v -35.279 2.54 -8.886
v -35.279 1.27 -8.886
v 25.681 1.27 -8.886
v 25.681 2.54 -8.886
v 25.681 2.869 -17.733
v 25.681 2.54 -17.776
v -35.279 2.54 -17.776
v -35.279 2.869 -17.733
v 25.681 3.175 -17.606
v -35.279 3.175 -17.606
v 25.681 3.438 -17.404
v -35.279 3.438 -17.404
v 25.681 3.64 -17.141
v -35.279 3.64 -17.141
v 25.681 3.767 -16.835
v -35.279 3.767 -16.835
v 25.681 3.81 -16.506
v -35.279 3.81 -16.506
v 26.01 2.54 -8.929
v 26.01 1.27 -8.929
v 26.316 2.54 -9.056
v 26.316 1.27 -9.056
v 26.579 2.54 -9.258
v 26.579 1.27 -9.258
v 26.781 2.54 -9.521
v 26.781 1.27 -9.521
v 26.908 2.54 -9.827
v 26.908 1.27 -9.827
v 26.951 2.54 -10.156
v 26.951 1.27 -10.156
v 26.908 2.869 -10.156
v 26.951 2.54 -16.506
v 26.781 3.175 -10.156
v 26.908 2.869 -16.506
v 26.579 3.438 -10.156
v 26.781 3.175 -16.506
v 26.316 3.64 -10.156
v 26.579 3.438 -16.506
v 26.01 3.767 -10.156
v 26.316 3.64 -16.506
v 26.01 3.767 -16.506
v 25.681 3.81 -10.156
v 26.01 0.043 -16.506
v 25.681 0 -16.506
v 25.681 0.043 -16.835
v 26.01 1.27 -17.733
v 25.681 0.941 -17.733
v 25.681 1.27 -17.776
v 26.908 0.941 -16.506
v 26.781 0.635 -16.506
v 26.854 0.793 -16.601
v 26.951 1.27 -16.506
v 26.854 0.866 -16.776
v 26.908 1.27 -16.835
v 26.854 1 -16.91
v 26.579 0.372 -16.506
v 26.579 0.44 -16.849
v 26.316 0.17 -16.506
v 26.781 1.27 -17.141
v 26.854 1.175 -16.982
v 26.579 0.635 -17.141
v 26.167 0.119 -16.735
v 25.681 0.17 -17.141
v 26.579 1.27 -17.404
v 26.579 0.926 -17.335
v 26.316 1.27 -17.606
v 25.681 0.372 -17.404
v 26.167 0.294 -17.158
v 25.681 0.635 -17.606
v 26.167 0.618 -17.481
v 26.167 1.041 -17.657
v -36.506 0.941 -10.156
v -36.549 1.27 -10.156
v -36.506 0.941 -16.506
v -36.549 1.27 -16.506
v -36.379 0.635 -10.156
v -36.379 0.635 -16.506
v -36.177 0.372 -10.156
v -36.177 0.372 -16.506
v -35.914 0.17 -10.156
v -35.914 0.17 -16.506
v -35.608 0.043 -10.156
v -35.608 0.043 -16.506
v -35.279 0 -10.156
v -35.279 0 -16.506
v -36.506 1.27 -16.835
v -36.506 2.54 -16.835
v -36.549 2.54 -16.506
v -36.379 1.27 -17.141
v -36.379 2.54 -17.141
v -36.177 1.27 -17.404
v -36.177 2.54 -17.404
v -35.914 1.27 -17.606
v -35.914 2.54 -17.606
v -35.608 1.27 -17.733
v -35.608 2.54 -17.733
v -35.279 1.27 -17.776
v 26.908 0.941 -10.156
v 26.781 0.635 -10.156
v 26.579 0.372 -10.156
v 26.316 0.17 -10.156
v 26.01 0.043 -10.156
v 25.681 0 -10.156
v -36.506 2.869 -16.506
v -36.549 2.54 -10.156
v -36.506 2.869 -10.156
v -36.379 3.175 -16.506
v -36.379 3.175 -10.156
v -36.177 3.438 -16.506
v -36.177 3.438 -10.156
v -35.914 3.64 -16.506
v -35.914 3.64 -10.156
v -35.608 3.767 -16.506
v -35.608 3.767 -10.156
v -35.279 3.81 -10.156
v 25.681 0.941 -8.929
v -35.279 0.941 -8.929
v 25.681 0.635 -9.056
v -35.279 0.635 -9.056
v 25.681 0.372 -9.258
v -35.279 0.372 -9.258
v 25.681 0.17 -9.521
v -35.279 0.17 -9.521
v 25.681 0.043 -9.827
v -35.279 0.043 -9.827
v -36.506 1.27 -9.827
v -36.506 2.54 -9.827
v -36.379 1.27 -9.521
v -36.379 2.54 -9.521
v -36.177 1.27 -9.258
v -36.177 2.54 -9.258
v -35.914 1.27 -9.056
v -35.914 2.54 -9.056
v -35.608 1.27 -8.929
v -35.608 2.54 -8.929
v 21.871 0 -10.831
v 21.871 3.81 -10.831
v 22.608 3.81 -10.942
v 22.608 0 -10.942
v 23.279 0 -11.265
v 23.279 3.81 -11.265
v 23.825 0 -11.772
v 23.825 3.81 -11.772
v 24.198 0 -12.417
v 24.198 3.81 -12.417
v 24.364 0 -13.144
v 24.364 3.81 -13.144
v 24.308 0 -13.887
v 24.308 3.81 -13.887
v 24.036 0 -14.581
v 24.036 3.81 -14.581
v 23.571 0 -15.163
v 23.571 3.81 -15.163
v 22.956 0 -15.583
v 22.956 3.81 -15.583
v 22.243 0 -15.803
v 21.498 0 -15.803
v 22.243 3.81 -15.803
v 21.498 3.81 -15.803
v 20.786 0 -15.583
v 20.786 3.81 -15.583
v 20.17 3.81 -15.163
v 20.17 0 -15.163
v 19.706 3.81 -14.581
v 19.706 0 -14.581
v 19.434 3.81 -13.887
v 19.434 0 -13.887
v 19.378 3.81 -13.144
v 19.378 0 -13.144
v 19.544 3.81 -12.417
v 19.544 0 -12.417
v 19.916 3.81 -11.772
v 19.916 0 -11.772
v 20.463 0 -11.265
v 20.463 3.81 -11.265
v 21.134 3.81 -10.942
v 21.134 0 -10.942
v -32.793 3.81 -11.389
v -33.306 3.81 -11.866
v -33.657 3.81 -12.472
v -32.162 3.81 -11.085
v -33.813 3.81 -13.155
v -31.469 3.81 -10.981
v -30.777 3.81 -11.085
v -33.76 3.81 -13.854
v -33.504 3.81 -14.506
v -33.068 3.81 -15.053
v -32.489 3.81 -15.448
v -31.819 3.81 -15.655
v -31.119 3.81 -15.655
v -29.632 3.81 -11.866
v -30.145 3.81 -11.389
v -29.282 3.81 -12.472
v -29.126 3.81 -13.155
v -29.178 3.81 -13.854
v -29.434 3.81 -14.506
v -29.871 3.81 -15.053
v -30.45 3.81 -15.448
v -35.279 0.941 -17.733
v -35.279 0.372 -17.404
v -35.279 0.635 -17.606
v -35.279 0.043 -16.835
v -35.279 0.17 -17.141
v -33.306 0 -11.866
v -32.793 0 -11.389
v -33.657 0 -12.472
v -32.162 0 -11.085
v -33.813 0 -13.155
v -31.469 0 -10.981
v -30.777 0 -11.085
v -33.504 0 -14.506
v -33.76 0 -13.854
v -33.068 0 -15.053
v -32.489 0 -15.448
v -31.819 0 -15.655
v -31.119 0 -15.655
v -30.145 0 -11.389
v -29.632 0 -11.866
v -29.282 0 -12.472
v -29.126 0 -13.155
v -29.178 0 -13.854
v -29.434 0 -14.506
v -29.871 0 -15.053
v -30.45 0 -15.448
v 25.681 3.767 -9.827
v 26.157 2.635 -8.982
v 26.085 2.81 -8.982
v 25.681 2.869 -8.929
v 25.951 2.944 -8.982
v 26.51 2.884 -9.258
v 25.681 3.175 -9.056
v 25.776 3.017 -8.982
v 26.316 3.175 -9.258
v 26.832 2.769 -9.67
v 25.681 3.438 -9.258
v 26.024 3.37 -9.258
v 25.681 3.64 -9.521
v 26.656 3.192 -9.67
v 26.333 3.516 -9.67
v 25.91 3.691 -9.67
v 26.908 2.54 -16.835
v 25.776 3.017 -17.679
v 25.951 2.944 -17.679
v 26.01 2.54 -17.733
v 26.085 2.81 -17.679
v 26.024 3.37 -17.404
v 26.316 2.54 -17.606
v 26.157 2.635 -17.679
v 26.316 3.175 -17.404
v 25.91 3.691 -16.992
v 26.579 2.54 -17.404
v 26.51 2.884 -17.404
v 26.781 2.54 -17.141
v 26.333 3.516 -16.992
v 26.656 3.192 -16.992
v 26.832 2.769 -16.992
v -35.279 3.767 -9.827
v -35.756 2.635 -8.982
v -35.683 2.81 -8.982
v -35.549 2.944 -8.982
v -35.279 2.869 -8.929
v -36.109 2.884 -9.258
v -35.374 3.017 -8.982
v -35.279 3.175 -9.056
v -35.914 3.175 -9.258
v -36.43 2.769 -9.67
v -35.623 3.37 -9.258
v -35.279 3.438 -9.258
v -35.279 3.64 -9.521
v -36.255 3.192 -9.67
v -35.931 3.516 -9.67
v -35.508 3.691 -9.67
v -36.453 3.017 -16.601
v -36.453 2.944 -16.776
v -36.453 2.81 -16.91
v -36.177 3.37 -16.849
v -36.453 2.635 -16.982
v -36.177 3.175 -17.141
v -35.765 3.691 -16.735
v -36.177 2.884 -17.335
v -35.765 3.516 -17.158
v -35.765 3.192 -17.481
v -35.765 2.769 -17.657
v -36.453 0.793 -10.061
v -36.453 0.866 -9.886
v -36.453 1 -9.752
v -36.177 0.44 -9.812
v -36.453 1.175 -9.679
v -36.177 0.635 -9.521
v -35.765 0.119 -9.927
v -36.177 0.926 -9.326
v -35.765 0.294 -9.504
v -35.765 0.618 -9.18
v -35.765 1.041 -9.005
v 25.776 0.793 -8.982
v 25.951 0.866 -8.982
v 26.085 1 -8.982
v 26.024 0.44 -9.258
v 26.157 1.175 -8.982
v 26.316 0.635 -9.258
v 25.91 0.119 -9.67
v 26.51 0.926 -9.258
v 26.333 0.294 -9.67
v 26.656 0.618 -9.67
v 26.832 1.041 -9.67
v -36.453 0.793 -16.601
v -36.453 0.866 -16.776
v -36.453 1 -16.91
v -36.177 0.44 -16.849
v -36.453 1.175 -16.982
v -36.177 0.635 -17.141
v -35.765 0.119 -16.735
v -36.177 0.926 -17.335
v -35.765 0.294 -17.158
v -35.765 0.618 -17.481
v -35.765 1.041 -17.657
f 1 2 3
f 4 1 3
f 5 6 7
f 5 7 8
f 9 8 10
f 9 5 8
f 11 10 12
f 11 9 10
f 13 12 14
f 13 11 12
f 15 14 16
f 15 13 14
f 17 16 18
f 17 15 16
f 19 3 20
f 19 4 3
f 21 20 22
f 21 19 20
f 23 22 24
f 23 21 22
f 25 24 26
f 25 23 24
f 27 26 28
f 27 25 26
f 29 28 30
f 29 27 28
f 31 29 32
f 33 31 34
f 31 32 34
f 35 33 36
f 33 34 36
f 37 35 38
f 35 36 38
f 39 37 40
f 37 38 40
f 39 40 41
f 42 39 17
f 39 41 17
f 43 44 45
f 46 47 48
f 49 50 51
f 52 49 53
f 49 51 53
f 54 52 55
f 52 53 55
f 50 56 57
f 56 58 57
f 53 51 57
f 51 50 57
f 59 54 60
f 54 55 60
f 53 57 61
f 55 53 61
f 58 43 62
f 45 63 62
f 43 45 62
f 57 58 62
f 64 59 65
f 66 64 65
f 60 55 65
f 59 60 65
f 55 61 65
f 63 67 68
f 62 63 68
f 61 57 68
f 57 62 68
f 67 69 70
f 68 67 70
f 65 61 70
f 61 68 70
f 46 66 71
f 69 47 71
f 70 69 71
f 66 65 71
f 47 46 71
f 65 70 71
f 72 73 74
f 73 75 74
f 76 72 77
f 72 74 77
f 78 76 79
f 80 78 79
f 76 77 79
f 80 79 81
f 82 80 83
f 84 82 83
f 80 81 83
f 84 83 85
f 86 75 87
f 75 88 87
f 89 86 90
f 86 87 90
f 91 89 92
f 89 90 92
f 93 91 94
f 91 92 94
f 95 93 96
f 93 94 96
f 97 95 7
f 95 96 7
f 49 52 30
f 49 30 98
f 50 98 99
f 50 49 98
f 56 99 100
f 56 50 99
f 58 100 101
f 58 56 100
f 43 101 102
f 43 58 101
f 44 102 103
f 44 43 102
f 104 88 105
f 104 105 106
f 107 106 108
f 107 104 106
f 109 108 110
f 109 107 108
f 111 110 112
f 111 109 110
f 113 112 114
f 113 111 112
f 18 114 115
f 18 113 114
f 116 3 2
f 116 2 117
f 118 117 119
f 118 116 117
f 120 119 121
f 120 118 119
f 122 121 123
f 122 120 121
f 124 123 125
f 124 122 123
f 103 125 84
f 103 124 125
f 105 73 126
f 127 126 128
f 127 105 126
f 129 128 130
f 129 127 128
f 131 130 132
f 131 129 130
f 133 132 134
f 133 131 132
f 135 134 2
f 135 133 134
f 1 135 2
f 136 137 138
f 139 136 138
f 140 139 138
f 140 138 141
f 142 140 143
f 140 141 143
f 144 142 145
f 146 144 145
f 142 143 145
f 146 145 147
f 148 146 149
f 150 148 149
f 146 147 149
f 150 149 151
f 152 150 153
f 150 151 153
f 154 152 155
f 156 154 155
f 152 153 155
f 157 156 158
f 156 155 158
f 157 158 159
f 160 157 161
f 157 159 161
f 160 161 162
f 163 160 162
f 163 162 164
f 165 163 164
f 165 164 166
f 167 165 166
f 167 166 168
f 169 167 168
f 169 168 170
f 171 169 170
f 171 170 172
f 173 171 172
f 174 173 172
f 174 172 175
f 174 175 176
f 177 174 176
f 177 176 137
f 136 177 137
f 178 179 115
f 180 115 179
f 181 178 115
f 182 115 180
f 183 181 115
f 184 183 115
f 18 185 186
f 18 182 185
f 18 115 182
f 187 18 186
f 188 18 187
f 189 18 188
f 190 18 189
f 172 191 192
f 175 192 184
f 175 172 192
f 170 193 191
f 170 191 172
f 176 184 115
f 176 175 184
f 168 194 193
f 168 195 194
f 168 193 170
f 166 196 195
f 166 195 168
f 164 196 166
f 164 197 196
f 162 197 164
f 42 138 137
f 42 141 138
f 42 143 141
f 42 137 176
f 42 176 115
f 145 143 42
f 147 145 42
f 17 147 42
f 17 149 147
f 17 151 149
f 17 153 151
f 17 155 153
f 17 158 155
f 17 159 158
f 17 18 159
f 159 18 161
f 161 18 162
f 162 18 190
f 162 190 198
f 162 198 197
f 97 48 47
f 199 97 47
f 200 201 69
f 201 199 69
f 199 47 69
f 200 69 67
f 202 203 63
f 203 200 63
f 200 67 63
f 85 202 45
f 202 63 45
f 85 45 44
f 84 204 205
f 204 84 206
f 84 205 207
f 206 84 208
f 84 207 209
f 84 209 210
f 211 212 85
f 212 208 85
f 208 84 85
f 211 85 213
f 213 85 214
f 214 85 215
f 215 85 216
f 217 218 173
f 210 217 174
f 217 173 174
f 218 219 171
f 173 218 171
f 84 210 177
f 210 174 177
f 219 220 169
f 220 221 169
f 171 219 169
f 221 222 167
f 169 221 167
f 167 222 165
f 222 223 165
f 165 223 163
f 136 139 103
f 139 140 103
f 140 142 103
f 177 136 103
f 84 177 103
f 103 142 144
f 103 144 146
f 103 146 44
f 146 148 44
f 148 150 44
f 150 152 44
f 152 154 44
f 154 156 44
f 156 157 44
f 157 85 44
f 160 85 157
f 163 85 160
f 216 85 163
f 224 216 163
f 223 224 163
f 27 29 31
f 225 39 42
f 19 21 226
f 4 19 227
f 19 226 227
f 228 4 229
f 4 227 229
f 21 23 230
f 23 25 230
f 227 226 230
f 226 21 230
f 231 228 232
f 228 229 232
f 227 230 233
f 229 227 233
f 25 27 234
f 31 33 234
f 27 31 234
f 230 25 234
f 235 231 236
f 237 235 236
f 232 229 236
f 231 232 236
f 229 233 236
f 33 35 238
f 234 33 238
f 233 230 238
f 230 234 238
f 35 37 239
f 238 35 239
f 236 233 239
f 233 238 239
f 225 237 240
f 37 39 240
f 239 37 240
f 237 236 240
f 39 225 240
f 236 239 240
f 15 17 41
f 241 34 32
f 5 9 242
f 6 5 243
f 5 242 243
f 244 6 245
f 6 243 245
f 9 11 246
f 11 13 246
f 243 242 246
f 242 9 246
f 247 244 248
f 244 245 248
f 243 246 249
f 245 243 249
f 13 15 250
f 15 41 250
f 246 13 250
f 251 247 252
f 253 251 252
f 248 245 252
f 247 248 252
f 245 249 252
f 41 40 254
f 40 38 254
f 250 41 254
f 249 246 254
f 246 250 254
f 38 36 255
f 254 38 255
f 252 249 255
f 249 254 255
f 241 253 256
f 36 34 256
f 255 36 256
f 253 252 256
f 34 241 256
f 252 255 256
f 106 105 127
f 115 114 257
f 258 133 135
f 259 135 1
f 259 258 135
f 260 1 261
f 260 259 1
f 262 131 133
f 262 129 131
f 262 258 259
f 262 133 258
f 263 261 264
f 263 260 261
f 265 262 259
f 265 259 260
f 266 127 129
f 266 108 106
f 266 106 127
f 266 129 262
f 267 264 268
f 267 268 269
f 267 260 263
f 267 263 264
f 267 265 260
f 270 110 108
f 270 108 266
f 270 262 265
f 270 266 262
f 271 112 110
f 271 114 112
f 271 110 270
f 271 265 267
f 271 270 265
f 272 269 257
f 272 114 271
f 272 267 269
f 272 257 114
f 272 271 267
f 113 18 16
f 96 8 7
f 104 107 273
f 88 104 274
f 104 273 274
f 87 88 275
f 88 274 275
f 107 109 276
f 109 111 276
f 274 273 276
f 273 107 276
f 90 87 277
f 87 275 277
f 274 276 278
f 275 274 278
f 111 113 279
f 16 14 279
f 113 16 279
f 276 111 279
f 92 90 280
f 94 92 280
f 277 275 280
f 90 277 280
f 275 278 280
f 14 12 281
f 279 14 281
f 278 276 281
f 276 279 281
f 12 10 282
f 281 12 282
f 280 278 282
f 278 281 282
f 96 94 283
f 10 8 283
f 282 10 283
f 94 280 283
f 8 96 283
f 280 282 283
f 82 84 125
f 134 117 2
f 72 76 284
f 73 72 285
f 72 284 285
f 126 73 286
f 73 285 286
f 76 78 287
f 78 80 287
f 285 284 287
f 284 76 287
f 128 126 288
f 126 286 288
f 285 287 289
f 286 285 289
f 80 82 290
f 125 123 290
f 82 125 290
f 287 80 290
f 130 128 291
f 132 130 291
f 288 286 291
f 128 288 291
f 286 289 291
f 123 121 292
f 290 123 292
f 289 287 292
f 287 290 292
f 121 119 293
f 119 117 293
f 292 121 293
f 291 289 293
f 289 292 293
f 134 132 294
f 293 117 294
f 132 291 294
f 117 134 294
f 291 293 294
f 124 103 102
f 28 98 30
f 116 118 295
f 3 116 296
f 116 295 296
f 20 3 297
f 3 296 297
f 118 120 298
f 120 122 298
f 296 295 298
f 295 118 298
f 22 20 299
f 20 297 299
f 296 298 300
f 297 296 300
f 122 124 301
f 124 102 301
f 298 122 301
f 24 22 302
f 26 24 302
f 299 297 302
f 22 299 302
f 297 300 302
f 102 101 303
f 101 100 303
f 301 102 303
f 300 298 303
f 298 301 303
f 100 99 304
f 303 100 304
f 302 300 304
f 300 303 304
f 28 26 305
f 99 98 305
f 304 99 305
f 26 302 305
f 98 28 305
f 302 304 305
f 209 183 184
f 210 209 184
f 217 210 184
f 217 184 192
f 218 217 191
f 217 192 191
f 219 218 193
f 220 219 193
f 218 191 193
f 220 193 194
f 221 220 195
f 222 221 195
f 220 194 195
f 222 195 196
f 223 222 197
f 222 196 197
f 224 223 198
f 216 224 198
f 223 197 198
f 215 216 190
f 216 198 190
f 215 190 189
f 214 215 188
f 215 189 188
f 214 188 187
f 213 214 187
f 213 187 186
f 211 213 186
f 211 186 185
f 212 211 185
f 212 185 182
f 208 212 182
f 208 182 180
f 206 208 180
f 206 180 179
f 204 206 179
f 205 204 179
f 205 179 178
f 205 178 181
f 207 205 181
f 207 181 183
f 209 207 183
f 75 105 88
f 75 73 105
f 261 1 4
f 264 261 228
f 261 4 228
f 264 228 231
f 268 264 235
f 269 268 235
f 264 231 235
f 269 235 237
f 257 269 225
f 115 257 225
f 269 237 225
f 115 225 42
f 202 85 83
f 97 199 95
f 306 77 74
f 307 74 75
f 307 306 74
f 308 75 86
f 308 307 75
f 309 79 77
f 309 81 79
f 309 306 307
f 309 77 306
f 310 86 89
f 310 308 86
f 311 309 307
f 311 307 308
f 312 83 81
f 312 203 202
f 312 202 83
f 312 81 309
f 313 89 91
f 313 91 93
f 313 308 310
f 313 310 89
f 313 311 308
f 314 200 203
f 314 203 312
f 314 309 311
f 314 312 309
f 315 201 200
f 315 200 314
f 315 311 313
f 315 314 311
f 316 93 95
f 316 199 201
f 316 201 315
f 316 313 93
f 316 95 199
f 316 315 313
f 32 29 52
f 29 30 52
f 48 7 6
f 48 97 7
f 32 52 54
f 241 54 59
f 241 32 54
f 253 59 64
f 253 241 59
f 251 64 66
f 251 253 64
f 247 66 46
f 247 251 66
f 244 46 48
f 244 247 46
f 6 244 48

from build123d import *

# Parameters (mm, degrees)
SKETCH1_W           = 63.5
SKETCH1_H           = 8.89
BOSS_EXTRUDE1_DEPTH = 3.81
FILLET1_R           = 1.27
SKETCH2_R           = 2.35
SKETCH2_R_2         = 2.5
CUT_EXTRUDE1_DEPTH  = 41.820799329


with BuildPart() as part:
    # Sketch1 → Boss-Extrude1 (new body)
    with BuildSketch(Plane(origin=(0, 0, 0), x_dir=(1, 0, 0), z_dir=(0, 1, 0))):
        with Locations((-4.799174917, 13.330808581)):
            Rectangle(SKETCH1_W, SKETCH1_H)
    extrude(amount=BOSS_EXTRUDE1_DEPTH)

    # Fillet1
    fillet1_edges = [part.edges().sort_by_distance(p)[0] for p in [
        (26.950825083, 3.81, -13.330808581),
        (-4.799174917, 3.81, -17.775808581),
        (-36.549174917, 3.81, -13.330808581),
        (-4.799174917, 0, -17.775808581),
        (26.950825083, 0, -13.330808581),
        (-4.799174917, 0, -8.885808581),
        (-36.549174917, 0, -13.330808581),
        (-36.549174917, 1.905, -17.775808581),
        (26.950825083, 1.905, -17.775808581),
        (26.950825083, 1.905, -8.885808581),
        (-36.549174917, 1.905, -8.885808581),
        (-4.799174917, 3.81, -8.885808581),
    ]]
    fillet(fillet1_edges, radius=FILLET1_R)

    # Sketch2 → Cut-Extrude1 (cut, through all)
    with BuildSketch(Plane(origin=(0, 3.81, 0), x_dir=(1, 0, 0), z_dir=(0, 1, 0))):
        with Locations(Location((-31.469174917, 13.330808581, 0), (0, 0, 270))):
            Circle(SKETCH2_R)
        with Locations(Location((21.870825083, 13.330808581, 0), (0, 0, 270))):
            Circle(SKETCH2_R_2)
    extrude(amount=-CUT_EXTRUDE1_DEPTH, mode=Mode.SUBTRACT)


solid = part.part
